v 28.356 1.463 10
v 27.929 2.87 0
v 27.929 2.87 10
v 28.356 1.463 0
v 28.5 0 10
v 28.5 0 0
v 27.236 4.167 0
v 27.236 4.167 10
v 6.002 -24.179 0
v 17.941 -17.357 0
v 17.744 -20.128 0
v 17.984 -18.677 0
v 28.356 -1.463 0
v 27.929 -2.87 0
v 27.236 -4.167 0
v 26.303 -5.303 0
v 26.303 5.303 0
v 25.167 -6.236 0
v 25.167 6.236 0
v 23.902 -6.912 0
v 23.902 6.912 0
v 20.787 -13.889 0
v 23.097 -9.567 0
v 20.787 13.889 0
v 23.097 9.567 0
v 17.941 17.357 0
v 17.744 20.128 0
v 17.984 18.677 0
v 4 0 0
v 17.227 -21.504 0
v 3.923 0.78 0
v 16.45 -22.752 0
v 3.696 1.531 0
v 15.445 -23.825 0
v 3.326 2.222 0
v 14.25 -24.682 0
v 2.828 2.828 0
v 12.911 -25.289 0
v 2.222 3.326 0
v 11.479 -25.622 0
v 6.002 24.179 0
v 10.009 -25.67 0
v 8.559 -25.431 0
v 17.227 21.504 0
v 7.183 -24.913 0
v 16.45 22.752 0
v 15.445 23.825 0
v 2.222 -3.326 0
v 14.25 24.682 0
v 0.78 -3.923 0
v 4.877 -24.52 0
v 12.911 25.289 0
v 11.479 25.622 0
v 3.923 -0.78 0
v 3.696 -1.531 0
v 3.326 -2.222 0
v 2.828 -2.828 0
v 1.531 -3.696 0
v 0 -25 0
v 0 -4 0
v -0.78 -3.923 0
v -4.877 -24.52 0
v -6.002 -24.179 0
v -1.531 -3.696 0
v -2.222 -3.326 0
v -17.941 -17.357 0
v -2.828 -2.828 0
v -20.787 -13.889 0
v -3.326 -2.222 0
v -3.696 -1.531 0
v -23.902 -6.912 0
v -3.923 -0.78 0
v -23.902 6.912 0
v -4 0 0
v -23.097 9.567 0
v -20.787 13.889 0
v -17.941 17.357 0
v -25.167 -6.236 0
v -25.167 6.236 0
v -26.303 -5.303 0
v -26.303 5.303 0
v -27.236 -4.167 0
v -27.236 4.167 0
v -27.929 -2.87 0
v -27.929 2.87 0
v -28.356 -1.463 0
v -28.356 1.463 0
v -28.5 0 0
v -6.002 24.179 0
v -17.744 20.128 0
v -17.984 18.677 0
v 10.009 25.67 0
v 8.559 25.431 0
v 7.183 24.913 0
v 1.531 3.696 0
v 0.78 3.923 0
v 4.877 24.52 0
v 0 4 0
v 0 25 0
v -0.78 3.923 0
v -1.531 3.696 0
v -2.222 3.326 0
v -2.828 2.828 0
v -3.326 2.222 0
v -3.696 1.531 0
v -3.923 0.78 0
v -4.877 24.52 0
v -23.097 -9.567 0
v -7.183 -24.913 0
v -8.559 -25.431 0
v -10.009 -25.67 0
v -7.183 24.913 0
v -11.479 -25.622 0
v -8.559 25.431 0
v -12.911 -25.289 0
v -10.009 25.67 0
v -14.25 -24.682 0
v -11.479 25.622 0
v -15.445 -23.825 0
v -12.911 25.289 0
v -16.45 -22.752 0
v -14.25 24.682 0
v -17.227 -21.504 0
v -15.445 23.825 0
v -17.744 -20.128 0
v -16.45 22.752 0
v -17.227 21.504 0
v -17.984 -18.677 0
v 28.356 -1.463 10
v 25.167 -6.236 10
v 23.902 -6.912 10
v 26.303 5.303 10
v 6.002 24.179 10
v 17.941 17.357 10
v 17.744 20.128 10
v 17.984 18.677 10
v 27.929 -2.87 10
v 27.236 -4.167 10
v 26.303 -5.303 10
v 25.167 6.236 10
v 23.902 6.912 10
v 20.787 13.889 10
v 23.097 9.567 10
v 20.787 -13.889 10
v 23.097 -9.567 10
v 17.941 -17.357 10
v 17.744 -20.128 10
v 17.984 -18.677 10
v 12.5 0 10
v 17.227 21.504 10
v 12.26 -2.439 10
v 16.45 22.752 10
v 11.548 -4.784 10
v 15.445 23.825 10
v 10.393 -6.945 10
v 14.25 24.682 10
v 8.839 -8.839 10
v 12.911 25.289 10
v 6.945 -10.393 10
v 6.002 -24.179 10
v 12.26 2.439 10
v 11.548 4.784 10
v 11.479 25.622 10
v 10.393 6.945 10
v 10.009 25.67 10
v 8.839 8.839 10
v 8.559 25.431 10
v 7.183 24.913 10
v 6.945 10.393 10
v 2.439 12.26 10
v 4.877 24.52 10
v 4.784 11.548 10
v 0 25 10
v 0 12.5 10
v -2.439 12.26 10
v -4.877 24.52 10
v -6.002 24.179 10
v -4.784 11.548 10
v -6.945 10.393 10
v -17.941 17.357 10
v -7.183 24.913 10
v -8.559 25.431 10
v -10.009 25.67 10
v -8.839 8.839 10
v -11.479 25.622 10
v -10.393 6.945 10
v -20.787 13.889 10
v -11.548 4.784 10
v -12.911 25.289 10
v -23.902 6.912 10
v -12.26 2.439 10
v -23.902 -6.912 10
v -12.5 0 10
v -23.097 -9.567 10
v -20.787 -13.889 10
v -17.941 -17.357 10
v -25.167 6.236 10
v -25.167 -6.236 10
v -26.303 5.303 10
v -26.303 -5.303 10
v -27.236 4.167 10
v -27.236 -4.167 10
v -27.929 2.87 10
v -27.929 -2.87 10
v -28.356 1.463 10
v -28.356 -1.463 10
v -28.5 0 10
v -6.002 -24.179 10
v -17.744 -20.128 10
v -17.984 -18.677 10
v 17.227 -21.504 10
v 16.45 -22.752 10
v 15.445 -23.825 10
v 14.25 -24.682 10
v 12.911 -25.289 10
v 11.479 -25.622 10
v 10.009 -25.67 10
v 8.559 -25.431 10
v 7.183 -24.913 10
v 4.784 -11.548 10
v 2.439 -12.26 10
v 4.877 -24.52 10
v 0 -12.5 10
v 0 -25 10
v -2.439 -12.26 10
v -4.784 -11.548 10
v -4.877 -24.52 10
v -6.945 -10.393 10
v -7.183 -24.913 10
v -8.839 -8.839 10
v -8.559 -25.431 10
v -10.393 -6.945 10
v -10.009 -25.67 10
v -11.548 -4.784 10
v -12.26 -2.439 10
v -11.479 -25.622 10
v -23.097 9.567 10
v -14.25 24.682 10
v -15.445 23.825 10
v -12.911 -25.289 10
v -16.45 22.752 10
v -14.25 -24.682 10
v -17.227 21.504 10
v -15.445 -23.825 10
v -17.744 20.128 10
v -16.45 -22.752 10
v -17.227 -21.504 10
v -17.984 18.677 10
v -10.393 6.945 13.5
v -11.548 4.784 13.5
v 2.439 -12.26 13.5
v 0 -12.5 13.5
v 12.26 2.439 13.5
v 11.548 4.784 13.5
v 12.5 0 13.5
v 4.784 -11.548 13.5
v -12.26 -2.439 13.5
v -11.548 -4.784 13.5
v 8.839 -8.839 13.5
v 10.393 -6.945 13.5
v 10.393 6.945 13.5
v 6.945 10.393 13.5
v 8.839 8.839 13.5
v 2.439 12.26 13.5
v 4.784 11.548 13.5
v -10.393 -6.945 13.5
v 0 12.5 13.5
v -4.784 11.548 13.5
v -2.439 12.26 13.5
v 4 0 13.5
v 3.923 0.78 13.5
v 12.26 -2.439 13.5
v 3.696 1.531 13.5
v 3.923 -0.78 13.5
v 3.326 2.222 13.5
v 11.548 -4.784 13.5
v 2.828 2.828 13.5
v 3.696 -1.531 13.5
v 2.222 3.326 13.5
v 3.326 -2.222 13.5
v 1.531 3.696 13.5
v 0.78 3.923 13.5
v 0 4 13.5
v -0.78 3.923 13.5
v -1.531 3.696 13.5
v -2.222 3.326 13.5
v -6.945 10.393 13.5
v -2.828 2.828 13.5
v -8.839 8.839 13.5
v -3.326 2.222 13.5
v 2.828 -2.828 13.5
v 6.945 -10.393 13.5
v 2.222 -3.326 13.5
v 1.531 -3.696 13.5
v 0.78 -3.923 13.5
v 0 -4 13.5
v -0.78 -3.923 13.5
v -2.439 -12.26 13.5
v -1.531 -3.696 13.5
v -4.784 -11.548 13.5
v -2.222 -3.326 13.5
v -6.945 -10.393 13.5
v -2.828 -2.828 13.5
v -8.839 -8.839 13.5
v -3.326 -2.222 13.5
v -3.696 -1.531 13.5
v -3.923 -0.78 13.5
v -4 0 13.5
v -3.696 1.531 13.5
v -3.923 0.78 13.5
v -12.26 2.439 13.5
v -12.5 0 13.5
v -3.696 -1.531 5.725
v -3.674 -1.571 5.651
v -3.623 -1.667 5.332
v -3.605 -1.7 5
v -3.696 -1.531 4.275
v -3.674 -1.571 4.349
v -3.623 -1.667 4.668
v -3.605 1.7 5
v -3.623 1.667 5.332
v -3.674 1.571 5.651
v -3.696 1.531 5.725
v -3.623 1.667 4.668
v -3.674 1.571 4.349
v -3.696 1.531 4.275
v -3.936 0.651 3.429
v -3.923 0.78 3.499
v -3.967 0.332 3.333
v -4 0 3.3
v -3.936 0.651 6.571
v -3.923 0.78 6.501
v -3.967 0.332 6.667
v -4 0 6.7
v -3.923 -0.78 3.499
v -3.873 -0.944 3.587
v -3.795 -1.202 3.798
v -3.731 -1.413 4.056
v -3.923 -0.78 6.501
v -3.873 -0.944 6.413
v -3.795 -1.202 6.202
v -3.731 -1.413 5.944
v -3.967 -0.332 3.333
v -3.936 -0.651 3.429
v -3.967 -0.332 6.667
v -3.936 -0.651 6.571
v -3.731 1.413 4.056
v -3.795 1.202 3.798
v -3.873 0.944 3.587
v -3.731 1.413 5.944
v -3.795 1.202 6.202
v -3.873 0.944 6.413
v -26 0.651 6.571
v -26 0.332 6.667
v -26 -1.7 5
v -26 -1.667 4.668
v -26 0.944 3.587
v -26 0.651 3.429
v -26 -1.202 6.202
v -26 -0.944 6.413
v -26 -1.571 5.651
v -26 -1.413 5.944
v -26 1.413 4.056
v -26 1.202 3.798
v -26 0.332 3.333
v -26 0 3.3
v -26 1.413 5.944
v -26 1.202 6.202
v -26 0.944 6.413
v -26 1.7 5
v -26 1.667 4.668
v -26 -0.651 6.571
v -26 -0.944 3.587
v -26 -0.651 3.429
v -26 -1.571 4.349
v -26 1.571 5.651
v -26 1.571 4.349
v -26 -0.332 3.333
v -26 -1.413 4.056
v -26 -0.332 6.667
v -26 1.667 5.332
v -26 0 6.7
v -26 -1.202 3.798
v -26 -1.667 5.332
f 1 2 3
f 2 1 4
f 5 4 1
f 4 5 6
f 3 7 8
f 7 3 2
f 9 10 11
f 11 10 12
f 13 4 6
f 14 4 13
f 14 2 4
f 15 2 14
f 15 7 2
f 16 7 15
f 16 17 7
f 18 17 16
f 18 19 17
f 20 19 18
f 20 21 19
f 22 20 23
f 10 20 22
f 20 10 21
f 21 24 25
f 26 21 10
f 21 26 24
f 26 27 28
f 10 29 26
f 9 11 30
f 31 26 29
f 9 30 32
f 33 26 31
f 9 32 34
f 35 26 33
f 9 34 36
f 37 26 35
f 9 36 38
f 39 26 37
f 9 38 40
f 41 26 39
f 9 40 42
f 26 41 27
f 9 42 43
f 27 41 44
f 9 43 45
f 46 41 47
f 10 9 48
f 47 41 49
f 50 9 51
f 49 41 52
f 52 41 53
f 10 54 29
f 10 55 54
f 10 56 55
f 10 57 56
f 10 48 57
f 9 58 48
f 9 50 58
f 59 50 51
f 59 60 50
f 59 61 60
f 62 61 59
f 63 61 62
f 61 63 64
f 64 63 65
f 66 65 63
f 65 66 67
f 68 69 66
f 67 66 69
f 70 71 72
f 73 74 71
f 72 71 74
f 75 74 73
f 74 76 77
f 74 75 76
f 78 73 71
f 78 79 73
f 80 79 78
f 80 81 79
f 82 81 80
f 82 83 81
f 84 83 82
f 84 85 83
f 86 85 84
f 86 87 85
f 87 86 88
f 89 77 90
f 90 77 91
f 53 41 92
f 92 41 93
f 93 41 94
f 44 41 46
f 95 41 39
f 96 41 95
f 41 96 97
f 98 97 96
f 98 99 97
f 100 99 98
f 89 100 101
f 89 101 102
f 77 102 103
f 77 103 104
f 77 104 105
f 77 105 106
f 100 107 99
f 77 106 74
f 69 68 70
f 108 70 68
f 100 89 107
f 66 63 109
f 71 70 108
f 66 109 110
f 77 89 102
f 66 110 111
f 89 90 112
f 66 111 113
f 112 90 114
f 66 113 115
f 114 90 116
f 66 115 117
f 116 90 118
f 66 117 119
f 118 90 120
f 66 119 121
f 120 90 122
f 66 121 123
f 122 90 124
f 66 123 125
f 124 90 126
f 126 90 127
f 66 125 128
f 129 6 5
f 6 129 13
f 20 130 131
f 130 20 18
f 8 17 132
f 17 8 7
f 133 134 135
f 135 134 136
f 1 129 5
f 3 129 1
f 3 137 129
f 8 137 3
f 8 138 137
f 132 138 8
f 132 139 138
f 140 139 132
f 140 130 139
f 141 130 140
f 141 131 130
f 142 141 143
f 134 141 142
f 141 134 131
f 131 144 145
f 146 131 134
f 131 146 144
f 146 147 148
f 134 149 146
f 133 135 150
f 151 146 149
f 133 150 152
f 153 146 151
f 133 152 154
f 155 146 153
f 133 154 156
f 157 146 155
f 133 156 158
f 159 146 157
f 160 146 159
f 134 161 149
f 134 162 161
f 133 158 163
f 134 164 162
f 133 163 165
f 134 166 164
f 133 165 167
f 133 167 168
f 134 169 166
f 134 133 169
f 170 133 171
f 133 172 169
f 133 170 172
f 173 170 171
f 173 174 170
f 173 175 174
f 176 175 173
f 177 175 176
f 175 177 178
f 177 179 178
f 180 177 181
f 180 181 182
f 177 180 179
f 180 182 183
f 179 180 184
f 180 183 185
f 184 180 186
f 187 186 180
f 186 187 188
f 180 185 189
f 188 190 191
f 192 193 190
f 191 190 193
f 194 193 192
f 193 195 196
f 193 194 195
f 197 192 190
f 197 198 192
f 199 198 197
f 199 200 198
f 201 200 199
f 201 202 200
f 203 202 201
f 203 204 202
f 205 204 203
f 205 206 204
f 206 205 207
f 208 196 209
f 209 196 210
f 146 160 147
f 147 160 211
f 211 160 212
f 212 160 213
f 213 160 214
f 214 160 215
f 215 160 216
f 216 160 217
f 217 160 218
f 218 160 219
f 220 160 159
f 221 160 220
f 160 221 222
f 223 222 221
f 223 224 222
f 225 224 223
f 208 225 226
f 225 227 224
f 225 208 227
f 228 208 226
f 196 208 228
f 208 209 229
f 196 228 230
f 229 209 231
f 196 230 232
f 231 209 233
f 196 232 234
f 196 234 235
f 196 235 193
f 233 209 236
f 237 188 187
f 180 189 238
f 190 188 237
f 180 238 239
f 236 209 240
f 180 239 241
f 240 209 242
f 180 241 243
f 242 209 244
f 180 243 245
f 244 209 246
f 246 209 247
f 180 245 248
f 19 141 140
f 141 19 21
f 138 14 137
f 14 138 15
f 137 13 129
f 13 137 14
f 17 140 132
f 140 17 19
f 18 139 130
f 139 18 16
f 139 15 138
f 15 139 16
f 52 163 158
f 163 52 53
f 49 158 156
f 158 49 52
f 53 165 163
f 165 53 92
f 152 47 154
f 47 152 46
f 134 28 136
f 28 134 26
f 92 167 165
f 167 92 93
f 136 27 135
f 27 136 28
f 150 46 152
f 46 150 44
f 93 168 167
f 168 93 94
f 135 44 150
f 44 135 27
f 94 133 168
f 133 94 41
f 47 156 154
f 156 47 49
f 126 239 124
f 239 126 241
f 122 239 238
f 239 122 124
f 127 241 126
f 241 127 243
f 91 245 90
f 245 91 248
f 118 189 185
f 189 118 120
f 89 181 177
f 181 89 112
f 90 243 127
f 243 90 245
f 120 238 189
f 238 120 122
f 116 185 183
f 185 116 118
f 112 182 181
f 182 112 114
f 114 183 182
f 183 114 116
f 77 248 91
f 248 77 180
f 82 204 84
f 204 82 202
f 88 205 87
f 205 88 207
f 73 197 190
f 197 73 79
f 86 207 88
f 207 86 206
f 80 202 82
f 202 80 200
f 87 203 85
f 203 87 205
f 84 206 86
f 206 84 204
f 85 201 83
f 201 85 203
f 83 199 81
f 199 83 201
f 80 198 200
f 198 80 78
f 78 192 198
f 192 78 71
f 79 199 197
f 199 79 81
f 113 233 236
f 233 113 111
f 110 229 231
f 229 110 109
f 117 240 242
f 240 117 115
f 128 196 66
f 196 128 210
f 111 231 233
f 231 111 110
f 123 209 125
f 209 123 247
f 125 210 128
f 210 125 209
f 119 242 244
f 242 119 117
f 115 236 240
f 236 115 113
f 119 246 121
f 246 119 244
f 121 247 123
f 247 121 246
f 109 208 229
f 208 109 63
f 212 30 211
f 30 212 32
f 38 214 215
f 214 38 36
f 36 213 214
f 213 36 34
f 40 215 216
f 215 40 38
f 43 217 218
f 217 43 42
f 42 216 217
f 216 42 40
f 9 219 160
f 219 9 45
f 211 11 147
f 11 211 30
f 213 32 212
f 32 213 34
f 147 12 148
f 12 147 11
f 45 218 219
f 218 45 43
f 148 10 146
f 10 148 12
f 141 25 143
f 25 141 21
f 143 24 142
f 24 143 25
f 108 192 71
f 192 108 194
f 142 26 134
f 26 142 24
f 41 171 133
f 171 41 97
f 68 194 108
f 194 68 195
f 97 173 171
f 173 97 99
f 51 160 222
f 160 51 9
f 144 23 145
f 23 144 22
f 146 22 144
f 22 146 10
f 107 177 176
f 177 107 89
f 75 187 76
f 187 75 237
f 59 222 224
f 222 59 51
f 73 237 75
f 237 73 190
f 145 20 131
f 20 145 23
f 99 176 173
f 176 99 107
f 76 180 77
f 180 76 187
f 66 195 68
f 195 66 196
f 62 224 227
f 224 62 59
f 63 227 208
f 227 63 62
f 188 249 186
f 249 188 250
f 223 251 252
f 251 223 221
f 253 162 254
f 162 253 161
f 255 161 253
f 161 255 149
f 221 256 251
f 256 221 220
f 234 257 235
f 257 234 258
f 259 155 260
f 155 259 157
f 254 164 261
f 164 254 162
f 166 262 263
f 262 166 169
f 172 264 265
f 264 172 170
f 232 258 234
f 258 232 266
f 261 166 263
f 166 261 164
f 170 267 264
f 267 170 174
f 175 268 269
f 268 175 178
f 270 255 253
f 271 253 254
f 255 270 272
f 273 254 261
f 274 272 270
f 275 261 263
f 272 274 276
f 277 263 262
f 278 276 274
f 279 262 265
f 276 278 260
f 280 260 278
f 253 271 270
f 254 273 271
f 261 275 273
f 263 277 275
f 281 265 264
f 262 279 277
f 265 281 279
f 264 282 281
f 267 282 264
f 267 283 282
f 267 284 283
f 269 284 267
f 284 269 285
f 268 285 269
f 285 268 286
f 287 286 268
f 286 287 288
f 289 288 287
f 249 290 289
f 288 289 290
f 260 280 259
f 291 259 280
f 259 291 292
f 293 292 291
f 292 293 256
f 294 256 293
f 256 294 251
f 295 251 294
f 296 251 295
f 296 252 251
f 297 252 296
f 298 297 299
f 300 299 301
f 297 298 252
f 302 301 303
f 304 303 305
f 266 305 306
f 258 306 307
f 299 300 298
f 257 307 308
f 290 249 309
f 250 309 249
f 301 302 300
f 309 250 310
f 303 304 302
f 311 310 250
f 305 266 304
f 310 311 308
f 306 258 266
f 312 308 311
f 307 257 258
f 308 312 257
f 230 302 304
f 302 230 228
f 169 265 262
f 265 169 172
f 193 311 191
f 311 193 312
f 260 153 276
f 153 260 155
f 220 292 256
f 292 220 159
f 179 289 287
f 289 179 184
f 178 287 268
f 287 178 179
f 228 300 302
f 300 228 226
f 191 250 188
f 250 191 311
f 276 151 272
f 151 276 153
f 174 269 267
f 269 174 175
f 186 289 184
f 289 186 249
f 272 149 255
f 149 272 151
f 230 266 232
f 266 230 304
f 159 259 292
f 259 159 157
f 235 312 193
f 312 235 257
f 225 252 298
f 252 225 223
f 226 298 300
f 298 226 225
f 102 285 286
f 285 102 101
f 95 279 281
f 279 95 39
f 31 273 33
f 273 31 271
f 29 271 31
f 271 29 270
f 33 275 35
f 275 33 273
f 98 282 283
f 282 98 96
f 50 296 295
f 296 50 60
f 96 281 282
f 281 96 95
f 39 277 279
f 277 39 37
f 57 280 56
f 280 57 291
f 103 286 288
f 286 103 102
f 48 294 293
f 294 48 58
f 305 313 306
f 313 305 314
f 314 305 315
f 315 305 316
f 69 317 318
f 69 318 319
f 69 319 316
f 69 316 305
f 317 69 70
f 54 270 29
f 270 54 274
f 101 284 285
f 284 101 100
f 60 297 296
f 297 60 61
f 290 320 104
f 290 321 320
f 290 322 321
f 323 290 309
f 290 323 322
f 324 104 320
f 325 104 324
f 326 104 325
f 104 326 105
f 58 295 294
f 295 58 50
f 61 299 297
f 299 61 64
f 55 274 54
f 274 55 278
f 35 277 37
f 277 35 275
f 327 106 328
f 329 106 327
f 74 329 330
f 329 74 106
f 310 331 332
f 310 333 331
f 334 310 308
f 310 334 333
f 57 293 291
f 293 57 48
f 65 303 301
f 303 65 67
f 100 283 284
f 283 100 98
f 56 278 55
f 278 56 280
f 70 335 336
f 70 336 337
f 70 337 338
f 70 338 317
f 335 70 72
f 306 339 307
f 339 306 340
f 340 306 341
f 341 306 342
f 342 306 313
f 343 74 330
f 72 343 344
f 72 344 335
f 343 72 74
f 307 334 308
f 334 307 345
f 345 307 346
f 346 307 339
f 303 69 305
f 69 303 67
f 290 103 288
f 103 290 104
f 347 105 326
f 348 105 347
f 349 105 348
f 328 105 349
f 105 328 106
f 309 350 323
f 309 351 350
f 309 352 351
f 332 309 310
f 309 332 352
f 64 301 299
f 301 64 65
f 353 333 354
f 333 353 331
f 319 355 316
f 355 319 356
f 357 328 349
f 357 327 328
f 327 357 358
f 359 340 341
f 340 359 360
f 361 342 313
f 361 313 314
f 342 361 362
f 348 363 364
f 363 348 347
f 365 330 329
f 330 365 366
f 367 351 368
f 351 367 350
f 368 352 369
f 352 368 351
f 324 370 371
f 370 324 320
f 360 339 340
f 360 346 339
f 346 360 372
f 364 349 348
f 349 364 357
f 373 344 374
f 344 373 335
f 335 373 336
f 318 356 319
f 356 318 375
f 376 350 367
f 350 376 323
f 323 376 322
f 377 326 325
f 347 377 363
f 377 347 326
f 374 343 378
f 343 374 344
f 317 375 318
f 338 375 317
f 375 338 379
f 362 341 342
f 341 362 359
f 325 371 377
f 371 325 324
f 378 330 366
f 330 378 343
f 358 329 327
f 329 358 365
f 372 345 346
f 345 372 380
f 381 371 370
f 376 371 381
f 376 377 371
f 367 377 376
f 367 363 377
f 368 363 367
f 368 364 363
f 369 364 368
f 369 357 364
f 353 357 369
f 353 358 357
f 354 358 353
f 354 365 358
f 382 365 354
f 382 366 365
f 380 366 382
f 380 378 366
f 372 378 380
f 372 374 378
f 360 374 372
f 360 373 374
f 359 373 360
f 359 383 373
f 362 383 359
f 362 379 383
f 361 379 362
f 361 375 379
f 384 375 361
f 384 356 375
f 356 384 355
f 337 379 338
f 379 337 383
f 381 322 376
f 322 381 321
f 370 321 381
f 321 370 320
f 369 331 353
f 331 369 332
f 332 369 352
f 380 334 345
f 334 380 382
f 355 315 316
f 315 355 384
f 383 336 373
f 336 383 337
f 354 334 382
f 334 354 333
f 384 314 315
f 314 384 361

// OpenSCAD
$fn = 32;

// ----------------------------------------------------------------------
// Hand knob: 50 x 50 x 13.5 mm
// ----------------------------------------------------------------------

// --- parameters (mm) ---
grip_d = 50;              // knob diameter
grip_h = 10;              // knob height
shaft_d = 8;              // shaft bore
set_d = 3.4;              // set screw tap hole
knurl_dia = 1.78;         // knurl groove diameter
lobes = 6;                // grip lobes
cap_h = 3.5;              // raised centre cap
cap_d = 25;               // centre cap diameter

module body() {
  cylinder(h = grip_h, d = grip_d);
  for (i = [0 : lobes - 1])
    rotate([0, 0, i * 360 / lobes])
      translate([grip_d * 0.42, 0, 0])
        cylinder(h = grip_h, d = grip_d * 0.3);
}

module cap() {
  translate([0, 0, grip_h - 1]) cylinder(h = cap_h + 1, d = cap_d);
}

difference() {
  union() {
    body();
    cap();
  }
  translate([0, 0, -1]) cylinder(h = grip_h + cap_h + 2, d = shaft_d);
  translate([-grip_d / 2 - 1, 0, grip_h * 0.5]) rotate([0, 90, 0]) cylinder(h = grip_d / 2 + 2, d = set_d);
}
